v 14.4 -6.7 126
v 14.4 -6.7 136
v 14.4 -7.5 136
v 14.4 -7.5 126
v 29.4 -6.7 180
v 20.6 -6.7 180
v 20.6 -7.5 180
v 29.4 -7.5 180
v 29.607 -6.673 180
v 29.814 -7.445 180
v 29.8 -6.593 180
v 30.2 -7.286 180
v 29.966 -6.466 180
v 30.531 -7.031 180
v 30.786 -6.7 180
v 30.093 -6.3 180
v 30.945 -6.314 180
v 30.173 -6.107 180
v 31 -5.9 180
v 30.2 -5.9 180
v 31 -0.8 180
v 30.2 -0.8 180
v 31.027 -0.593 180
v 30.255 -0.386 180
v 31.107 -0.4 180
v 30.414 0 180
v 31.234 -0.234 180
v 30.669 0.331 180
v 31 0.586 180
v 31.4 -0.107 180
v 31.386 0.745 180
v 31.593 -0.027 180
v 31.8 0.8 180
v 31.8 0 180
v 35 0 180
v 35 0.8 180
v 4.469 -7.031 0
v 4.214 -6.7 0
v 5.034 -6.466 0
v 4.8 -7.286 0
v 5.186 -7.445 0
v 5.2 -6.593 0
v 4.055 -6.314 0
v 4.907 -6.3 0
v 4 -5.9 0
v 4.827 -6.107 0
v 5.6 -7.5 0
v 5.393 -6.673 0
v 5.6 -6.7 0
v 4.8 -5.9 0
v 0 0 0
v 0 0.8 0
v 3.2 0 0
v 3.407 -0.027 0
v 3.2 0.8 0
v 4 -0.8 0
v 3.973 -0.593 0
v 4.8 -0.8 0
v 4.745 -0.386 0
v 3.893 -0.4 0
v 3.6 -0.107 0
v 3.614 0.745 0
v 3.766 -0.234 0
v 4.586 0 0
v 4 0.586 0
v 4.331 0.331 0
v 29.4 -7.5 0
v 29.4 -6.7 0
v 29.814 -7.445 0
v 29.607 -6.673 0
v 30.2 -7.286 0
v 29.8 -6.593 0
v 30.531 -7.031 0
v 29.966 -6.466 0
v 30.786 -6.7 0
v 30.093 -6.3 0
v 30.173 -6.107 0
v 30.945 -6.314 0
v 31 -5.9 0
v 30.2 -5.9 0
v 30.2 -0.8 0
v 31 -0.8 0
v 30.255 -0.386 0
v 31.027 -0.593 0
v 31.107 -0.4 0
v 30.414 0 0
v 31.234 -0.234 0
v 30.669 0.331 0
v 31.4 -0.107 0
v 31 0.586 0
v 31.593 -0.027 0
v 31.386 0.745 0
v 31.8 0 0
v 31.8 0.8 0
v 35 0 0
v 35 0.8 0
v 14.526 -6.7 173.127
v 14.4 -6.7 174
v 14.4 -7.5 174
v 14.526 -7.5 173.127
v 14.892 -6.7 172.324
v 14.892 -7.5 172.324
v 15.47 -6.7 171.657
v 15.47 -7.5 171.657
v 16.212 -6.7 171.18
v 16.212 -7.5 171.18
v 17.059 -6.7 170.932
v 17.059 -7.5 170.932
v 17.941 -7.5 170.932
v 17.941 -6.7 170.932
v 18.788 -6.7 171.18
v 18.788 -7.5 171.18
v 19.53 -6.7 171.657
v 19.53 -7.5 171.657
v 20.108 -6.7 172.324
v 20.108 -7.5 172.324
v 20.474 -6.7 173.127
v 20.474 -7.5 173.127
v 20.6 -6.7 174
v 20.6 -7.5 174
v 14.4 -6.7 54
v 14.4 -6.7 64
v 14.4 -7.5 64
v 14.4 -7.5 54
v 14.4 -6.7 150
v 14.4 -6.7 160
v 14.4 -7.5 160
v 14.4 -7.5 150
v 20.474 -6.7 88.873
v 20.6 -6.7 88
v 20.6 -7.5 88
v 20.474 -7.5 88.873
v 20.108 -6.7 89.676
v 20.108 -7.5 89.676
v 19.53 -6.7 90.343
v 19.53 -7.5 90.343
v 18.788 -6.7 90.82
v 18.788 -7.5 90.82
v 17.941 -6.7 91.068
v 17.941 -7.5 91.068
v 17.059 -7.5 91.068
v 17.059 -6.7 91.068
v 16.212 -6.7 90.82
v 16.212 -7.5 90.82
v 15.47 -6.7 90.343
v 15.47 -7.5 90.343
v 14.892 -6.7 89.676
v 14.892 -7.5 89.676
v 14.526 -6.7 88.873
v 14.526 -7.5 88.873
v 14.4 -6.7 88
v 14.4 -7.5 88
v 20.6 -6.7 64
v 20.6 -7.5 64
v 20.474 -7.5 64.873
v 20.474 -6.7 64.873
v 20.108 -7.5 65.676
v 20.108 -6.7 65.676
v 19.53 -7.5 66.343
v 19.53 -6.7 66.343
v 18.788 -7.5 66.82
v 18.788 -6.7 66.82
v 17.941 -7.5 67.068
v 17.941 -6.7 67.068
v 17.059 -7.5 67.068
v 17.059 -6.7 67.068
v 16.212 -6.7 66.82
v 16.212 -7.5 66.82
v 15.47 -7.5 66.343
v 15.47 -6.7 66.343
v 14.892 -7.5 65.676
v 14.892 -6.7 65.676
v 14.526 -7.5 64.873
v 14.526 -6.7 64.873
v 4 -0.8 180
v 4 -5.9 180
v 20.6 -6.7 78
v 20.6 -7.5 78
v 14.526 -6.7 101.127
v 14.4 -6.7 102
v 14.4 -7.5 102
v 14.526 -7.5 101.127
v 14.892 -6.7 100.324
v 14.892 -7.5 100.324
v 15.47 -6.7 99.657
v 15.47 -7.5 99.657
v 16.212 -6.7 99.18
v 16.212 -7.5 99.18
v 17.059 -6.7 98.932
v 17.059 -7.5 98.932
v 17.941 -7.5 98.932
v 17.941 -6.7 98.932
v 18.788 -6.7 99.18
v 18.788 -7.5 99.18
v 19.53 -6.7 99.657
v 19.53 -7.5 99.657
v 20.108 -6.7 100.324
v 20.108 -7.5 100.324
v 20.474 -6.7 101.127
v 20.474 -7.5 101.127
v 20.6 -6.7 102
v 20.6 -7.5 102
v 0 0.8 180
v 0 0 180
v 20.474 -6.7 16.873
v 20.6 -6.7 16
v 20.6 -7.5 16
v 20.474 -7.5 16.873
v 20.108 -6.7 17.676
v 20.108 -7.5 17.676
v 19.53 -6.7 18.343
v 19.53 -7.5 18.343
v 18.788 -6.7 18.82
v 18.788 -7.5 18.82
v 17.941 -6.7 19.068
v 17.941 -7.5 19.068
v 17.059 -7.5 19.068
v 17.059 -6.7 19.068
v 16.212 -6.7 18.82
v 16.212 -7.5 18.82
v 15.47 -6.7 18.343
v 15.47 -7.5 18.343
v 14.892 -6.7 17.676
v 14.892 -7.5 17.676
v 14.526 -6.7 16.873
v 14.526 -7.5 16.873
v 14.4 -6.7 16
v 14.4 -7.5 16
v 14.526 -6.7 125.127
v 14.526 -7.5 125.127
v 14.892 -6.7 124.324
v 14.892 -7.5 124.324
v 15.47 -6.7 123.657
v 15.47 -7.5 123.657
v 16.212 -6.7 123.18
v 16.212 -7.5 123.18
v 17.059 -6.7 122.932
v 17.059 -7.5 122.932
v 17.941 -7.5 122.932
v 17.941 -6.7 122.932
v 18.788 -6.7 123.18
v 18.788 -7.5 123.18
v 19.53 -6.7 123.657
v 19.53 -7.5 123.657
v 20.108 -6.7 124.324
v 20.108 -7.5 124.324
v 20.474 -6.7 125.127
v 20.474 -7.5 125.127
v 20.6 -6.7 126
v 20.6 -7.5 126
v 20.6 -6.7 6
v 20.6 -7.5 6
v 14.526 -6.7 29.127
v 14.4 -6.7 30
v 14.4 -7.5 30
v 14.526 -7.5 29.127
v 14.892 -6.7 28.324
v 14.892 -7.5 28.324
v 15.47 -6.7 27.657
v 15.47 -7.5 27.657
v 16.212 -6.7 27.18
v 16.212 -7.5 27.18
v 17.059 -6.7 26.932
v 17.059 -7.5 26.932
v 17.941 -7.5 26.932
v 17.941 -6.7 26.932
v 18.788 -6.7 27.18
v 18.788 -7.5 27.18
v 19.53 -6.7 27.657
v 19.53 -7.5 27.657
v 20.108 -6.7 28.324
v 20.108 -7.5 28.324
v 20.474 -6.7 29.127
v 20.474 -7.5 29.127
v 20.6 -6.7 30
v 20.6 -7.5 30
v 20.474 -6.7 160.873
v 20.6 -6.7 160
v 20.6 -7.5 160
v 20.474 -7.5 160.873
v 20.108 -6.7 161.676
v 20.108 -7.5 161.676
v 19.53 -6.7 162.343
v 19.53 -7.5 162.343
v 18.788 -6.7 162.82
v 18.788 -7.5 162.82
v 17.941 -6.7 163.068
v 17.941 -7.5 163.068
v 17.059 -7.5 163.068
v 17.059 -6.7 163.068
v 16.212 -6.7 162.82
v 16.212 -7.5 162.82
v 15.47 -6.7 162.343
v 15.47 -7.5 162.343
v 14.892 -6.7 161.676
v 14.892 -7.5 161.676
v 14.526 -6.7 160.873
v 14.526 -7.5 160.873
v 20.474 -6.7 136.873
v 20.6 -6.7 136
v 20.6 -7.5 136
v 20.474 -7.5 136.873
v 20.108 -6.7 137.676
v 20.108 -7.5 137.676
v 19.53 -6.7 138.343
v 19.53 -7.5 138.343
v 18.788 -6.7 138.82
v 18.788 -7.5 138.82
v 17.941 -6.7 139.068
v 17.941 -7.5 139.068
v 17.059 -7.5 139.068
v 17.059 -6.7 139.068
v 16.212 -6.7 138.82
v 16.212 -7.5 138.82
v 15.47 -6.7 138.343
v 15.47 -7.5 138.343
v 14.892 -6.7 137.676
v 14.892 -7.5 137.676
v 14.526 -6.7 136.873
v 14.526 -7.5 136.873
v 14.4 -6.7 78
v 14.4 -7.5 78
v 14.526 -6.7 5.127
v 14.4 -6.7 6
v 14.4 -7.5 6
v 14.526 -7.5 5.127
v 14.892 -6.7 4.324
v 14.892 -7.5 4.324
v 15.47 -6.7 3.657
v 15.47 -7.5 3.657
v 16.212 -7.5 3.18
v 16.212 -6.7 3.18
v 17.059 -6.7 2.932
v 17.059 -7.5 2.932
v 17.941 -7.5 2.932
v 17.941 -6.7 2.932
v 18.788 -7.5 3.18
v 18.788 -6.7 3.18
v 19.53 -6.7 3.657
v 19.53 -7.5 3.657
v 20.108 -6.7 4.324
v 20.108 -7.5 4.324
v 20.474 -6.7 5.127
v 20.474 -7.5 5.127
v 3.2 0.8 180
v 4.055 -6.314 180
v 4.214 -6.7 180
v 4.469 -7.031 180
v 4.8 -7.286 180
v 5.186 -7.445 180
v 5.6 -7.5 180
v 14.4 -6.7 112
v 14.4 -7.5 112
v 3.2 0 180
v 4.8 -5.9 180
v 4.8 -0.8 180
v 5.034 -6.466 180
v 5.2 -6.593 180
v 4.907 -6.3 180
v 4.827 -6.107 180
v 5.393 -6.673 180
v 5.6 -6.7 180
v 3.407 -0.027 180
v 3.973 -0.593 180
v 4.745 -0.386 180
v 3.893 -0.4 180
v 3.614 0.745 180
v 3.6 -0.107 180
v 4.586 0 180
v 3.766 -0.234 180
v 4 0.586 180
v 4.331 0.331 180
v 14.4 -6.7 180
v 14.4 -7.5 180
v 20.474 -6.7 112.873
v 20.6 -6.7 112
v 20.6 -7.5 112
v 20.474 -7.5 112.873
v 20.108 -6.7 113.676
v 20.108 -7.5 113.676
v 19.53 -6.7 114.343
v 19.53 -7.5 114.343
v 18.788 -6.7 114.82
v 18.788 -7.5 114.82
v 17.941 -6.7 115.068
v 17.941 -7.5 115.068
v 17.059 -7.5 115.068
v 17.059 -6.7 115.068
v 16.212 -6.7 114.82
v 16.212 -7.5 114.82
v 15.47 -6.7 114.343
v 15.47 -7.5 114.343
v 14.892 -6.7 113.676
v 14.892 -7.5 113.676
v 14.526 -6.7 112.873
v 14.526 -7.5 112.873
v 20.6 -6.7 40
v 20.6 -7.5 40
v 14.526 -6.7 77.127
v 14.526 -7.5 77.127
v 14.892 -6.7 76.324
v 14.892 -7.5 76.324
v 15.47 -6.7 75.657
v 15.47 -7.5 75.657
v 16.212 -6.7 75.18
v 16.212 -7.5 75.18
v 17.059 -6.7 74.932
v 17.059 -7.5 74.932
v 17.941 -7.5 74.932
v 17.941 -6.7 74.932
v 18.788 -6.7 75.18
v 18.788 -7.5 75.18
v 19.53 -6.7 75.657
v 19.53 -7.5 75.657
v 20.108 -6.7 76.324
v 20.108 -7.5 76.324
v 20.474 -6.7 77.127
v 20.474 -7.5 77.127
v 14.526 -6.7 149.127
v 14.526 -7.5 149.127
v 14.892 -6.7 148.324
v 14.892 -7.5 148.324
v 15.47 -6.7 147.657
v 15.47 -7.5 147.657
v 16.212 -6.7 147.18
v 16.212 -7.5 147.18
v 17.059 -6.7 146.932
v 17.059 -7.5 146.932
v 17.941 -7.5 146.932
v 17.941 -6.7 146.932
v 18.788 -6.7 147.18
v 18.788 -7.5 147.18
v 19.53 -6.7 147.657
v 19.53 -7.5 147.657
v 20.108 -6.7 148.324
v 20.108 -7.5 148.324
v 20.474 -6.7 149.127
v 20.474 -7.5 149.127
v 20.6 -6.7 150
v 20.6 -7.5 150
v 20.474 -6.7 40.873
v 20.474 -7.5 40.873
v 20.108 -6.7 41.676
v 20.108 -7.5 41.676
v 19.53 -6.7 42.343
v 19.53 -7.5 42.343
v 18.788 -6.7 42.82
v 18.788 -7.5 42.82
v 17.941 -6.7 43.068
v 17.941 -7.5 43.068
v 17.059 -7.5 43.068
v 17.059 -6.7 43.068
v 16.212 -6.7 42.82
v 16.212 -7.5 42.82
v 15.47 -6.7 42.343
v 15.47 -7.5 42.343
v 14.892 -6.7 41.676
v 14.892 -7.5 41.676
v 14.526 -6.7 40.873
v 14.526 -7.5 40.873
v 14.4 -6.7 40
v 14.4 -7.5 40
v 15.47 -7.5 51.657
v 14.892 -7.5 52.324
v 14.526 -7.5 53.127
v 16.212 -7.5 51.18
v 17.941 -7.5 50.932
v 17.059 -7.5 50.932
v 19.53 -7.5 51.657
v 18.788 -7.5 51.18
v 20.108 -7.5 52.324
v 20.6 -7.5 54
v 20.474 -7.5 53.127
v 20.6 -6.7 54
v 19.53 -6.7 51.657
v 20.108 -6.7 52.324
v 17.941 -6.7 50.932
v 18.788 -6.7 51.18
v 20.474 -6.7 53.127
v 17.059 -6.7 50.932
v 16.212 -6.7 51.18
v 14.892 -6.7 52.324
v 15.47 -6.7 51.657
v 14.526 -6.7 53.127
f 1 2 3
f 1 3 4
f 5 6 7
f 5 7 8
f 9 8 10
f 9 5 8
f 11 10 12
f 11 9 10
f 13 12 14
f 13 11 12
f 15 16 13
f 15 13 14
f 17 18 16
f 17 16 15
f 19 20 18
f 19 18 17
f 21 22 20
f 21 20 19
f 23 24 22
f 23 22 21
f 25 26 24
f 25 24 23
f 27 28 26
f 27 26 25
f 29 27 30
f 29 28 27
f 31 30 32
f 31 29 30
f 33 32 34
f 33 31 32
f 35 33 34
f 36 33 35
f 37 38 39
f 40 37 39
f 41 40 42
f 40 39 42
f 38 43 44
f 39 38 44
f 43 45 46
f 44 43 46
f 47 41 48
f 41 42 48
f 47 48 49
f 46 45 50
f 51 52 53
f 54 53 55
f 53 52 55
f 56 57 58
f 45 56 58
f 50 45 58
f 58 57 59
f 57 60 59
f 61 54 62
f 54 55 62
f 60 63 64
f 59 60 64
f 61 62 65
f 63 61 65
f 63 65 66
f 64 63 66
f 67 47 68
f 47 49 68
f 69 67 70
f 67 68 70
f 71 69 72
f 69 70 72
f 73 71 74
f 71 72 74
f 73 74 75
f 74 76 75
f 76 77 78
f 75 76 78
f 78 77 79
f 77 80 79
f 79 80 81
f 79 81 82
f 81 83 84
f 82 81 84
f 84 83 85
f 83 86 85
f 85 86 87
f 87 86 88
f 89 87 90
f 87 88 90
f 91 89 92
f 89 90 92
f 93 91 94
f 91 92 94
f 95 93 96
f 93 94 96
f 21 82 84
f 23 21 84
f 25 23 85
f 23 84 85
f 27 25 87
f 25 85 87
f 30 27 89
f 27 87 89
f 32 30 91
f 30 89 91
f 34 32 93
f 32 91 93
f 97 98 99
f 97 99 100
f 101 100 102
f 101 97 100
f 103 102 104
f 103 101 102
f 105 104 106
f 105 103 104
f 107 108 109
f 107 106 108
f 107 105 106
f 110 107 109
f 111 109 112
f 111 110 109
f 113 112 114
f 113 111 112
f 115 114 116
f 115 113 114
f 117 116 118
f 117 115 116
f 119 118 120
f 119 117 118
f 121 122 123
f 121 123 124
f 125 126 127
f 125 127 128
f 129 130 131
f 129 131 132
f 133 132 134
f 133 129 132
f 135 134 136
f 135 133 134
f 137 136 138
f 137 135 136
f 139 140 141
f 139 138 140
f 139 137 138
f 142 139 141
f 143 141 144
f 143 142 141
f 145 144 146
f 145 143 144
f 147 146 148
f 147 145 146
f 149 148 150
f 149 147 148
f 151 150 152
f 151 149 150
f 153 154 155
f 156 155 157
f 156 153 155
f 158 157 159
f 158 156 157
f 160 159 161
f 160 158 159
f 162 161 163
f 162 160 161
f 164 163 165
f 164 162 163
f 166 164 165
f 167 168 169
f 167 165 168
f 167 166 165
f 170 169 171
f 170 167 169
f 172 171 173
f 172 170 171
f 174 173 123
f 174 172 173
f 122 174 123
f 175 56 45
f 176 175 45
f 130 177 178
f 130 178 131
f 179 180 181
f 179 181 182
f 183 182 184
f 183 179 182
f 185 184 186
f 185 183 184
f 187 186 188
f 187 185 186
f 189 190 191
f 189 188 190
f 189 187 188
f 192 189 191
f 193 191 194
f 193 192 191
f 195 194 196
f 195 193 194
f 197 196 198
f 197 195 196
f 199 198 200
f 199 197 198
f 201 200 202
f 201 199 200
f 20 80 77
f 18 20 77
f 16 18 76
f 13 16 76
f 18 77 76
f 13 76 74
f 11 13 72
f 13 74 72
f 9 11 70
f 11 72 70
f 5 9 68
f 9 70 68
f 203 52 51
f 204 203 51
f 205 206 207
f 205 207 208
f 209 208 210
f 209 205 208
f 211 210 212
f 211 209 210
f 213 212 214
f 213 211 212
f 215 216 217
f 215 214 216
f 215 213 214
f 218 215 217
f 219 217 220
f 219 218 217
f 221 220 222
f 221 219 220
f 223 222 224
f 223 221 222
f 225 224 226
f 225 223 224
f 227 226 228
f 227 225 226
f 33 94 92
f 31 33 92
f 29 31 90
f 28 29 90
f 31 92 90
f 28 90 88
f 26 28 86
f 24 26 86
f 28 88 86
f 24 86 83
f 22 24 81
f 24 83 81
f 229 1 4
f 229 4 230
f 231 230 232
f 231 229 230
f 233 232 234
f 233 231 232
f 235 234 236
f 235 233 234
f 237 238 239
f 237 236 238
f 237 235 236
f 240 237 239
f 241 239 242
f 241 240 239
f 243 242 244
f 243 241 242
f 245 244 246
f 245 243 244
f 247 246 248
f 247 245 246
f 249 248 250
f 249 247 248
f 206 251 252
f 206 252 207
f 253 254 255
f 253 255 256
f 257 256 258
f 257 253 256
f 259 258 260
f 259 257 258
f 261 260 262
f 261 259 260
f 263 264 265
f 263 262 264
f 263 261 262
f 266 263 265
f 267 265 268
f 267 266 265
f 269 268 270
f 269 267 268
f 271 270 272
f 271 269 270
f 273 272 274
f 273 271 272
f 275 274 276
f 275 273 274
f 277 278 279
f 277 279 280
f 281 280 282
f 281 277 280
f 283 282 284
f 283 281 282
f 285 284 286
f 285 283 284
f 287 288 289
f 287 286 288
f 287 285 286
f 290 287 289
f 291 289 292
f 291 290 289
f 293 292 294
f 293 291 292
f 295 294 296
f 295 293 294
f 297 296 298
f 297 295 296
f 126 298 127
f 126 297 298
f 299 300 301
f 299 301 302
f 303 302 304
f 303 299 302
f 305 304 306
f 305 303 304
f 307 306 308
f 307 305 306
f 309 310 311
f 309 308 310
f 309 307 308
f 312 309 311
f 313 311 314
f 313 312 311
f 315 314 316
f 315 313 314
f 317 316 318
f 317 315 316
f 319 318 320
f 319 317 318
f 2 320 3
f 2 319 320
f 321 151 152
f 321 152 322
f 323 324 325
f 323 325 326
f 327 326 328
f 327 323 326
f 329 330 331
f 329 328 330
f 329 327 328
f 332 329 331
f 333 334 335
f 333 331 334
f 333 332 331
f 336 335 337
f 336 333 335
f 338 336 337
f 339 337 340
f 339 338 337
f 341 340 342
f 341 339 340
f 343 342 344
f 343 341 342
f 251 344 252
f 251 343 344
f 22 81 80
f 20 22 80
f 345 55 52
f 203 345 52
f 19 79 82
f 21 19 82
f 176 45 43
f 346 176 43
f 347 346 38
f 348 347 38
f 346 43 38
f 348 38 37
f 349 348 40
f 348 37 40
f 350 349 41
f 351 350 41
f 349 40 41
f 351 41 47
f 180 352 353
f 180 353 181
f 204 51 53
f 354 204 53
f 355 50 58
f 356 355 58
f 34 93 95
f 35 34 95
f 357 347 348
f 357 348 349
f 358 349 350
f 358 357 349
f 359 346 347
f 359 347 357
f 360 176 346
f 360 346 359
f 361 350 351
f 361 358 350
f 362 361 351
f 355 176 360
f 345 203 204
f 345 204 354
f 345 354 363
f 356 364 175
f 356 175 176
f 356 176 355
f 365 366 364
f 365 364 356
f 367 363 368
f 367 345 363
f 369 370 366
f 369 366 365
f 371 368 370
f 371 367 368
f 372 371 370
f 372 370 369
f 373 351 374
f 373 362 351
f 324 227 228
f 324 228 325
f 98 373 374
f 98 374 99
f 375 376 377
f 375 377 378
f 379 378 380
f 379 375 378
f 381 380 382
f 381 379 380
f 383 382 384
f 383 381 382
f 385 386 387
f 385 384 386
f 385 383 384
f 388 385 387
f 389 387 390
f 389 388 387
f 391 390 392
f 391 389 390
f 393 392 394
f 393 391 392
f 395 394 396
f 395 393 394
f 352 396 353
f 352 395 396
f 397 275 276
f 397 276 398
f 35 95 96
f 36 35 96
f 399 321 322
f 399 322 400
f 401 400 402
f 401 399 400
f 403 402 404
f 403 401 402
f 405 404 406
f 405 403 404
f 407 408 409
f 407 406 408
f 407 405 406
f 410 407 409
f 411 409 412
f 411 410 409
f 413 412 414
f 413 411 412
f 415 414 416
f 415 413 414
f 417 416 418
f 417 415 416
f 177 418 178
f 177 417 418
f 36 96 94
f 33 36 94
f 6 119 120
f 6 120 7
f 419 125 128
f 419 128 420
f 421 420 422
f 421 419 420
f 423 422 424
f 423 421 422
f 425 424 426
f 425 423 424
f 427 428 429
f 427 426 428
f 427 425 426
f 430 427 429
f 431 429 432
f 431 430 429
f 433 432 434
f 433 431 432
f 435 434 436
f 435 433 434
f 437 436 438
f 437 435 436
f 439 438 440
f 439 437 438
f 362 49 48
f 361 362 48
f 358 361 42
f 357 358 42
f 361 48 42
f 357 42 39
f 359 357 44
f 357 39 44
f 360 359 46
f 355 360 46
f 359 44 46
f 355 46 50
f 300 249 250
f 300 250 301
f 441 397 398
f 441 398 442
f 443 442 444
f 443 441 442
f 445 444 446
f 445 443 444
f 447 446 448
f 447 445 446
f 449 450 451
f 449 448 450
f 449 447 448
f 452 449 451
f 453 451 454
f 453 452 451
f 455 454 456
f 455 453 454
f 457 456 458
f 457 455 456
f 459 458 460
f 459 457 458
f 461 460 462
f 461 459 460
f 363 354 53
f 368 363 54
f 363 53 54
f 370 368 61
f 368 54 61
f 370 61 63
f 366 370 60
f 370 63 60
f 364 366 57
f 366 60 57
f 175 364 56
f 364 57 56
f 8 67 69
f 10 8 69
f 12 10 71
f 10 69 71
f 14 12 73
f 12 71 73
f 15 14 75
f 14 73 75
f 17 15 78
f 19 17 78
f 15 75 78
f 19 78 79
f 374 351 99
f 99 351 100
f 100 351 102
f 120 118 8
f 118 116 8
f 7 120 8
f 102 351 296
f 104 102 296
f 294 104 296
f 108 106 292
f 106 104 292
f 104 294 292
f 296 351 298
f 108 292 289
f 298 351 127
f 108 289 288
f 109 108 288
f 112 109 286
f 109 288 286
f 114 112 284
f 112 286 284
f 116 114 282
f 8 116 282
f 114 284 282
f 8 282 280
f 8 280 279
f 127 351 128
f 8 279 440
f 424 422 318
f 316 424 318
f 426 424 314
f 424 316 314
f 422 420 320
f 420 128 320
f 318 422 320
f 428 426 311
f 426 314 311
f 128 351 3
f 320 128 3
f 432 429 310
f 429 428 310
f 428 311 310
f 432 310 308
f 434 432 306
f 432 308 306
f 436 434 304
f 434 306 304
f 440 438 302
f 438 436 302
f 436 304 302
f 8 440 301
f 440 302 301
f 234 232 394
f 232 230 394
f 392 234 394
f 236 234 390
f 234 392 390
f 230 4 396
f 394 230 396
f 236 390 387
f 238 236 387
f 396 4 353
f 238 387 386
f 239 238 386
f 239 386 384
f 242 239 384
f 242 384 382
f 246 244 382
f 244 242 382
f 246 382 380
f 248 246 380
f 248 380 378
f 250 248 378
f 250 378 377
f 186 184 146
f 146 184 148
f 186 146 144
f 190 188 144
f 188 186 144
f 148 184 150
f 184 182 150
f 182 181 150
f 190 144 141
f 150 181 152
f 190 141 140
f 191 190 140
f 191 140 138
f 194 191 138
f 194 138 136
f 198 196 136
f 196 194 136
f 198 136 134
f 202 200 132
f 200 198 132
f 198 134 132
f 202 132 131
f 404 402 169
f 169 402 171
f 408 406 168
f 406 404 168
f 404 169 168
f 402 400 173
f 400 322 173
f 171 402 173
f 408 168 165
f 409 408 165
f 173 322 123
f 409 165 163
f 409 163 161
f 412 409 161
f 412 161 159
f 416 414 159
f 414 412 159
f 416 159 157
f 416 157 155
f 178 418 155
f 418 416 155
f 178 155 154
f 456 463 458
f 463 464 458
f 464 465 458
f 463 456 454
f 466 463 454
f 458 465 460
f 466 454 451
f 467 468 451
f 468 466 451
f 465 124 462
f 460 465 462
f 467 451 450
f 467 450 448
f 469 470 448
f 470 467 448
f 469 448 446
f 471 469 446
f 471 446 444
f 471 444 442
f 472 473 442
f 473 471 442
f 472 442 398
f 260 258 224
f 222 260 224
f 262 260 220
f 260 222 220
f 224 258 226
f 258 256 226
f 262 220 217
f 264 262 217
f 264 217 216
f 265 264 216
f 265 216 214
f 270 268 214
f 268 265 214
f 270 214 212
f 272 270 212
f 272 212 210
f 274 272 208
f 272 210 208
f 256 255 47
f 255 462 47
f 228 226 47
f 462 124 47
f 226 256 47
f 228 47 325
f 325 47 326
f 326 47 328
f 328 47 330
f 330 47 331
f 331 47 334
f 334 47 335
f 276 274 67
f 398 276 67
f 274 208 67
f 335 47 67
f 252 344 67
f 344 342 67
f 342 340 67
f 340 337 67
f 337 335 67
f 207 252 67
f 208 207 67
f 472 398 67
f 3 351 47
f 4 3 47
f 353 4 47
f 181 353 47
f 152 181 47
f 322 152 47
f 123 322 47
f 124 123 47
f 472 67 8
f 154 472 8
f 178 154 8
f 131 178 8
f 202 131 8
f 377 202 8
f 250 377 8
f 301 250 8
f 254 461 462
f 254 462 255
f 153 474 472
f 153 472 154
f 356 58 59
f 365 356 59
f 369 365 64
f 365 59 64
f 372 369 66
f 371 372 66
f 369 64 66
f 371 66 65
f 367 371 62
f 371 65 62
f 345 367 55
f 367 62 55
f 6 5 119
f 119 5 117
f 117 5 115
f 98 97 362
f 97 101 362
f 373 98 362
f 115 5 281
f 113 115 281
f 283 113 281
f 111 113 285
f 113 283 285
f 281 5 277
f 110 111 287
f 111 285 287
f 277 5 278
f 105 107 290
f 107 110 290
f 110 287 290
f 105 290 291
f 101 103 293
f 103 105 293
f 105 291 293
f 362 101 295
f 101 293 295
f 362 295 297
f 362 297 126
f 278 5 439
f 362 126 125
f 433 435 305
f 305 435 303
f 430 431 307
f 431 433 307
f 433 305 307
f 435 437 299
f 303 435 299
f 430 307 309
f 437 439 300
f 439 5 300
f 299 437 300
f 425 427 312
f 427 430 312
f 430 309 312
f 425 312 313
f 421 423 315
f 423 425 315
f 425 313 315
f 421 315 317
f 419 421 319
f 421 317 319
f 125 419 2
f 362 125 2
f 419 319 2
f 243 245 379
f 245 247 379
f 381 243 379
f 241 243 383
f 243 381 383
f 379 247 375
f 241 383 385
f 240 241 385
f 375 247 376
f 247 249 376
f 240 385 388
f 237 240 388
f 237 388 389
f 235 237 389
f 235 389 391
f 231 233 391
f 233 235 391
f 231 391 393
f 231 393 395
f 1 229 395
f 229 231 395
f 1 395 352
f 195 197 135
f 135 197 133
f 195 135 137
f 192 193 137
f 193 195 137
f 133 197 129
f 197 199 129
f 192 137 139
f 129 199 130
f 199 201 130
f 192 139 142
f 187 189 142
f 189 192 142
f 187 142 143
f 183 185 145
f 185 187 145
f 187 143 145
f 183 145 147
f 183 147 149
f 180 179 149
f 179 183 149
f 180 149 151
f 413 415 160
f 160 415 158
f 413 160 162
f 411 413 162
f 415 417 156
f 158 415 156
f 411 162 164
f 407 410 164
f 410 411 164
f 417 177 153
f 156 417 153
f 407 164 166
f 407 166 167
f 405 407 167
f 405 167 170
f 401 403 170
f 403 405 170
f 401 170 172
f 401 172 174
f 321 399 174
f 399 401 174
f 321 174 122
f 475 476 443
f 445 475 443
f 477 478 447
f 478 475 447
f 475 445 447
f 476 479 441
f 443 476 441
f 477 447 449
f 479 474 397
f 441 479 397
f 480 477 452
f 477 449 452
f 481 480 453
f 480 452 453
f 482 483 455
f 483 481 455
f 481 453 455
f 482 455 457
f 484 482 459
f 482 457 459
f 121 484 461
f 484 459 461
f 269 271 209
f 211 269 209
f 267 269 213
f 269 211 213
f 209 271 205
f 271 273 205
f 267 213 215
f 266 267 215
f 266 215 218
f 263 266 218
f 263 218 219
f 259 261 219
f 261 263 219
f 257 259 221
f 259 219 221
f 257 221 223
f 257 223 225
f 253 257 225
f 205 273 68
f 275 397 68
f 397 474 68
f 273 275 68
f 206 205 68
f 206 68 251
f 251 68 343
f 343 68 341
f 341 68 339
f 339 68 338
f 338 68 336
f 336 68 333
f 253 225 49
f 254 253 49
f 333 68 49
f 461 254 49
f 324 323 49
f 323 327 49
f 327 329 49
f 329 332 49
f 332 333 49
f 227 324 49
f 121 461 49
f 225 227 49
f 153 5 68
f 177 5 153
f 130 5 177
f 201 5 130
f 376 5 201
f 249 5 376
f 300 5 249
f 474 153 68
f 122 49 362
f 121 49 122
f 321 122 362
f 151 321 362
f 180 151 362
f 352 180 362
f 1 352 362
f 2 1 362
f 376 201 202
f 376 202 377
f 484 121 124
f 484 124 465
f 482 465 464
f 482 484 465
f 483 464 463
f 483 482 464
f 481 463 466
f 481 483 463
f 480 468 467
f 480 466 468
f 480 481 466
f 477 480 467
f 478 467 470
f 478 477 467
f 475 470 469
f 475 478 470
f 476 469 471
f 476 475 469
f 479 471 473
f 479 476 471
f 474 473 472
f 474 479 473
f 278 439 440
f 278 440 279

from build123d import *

# Parameters (mm, degrees)
SM_BASE_FLANGE_1_DEPTH = 180
CUT_EXTRUDE_1_DEPTH    = 184.524521522


# Sheet-metal steps are written as plain solids
with BuildPart() as part:
    # Sketch 1 → Базовая кромка1 (new body)
    with BuildSketch(Plane.XY):
        with BuildLine():
            Line((0, 0), (3.2, 0))
            ThreePointArc((3.2, 0), (3.765685425, -0.234314575), (4, -0.8))
            Line((4, -0.8), (4, -5.9))
            ThreePointArc((4, -5.9), (4.46862915, -7.03137085), (5.6, -7.5))
            Line((5.6, -7.5), (29.4, -7.5))
            ThreePointArc((29.4, -7.5), (30.53137085, -7.03137085), (31, -5.9))
            Line((31, -5.9), (31, -0.8))
            ThreePointArc((31, -0.8), (31.234314575, -0.234314575), (31.8, 0))
            Line((31.8, 0), (35, 0))
            Line((35, 0), (35, 0.8))
            Line((35, 0.8), (31.8, 0.8))
            ThreePointArc((31.8, 0.8), (30.66862915, 0.33137085), (30.2, -0.8))
            Line((30.2, -0.8), (30.2, -5.9))
            ThreePointArc((30.2, -5.9), (29.965685425, -6.465685425), (29.4, -6.7))
            Line((29.4, -6.7), (5.6, -6.7))
            ThreePointArc((5.6, -6.7), (5.034314575, -6.465685425), (4.8, -5.9))
            Line((4.8, -5.9), (4.8, -0.8))
            ThreePointArc((4.8, -0.8), (4.33137085, 0.33137085), (3.2, 0.8))
            Line((3.2, 0.8), (0, 0.8))
            Line((0, 0.8), (0, 0))
        make_face()
    extrude(amount=SM_BASE_FLANGE_1_DEPTH)

    # Эскиз6 → Вырез-Вытянуть1 (cut, through all)
    with BuildSketch(Plane(origin=(0, -6.7, 0), x_dir=(1, 0, 0), z_dir=(0, 1, 0))):
        with BuildLine():
            Line((20.6, -6), (20.6, -16))
            ThreePointArc((20.6, -16), (17.5, -19.1), (14.4, -16))
            Line((14.4, -16), (14.4, -6))
            ThreePointArc((14.4, -6), (17.5, -2.9), (20.6, -6))
        make_face()
        with BuildLine():
            Line((20.6, -30), (20.6, -40))
            ThreePointArc((20.6, -40), (17.5, -43.1), (14.4, -40))
            Line((14.4, -40), (14.4, -30))
            ThreePointArc((14.4, -30), (17.5, -26.9), (20.6, -30))
        make_face()
        with BuildLine():
            Line((20.6, -54), (20.6, -64))
            ThreePointArc((20.6, -64), (17.5, -67.1), (14.4, -64))
            Line((14.4, -64), (14.4, -54))
            ThreePointArc((14.4, -54), (17.5, -50.9), (20.6, -54))
        make_face()
        with BuildLine():
            Line((20.6, -78), (20.6, -88))
            ThreePointArc((20.6, -88), (17.5, -91.1), (14.4, -88))
            Line((14.4, -88), (14.4, -78))
            ThreePointArc((14.4, -78), (17.5, -74.9), (20.6, -78))
        make_face()
        with BuildLine():
            Line((20.6, -102), (20.6, -112))
            ThreePointArc((20.6, -112), (17.5, -115.1), (14.4, -112))
            Line((14.4, -112), (14.4, -102))
            ThreePointArc((14.4, -102), (17.5, -98.9), (20.6, -102))
        make_face()
        with BuildLine():
            Line((20.6, -126), (20.6, -136))
            ThreePointArc((20.6, -136), (17.5, -139.1), (14.4, -136))
            Line((14.4, -136), (14.4, -126))
            ThreePointArc((14.4, -126), (17.5, -122.9), (20.6, -126))
        make_face()
        with BuildLine():
            Line((20.6, -150), (20.6, -160))
            ThreePointArc((20.6, -160), (17.5, -163.1), (14.4, -160))
            Line((14.4, -160), (14.4, -150))
            ThreePointArc((14.4, -150), (17.5, -146.9), (20.6, -150))
        make_face()
        with BuildLine():
            Line((20.6, -174), (20.6, -184))
            ThreePointArc((20.6, -184), (17.5, -187.1), (14.4, -184))
            Line((14.4, -184), (14.4, -174))
            ThreePointArc((14.4, -174), (17.5, -170.9), (20.6, -174))
        make_face()
    extrude(amount=-CUT_EXTRUDE_1_DEPTH, mode=Mode.SUBTRACT)


solid = part.part
